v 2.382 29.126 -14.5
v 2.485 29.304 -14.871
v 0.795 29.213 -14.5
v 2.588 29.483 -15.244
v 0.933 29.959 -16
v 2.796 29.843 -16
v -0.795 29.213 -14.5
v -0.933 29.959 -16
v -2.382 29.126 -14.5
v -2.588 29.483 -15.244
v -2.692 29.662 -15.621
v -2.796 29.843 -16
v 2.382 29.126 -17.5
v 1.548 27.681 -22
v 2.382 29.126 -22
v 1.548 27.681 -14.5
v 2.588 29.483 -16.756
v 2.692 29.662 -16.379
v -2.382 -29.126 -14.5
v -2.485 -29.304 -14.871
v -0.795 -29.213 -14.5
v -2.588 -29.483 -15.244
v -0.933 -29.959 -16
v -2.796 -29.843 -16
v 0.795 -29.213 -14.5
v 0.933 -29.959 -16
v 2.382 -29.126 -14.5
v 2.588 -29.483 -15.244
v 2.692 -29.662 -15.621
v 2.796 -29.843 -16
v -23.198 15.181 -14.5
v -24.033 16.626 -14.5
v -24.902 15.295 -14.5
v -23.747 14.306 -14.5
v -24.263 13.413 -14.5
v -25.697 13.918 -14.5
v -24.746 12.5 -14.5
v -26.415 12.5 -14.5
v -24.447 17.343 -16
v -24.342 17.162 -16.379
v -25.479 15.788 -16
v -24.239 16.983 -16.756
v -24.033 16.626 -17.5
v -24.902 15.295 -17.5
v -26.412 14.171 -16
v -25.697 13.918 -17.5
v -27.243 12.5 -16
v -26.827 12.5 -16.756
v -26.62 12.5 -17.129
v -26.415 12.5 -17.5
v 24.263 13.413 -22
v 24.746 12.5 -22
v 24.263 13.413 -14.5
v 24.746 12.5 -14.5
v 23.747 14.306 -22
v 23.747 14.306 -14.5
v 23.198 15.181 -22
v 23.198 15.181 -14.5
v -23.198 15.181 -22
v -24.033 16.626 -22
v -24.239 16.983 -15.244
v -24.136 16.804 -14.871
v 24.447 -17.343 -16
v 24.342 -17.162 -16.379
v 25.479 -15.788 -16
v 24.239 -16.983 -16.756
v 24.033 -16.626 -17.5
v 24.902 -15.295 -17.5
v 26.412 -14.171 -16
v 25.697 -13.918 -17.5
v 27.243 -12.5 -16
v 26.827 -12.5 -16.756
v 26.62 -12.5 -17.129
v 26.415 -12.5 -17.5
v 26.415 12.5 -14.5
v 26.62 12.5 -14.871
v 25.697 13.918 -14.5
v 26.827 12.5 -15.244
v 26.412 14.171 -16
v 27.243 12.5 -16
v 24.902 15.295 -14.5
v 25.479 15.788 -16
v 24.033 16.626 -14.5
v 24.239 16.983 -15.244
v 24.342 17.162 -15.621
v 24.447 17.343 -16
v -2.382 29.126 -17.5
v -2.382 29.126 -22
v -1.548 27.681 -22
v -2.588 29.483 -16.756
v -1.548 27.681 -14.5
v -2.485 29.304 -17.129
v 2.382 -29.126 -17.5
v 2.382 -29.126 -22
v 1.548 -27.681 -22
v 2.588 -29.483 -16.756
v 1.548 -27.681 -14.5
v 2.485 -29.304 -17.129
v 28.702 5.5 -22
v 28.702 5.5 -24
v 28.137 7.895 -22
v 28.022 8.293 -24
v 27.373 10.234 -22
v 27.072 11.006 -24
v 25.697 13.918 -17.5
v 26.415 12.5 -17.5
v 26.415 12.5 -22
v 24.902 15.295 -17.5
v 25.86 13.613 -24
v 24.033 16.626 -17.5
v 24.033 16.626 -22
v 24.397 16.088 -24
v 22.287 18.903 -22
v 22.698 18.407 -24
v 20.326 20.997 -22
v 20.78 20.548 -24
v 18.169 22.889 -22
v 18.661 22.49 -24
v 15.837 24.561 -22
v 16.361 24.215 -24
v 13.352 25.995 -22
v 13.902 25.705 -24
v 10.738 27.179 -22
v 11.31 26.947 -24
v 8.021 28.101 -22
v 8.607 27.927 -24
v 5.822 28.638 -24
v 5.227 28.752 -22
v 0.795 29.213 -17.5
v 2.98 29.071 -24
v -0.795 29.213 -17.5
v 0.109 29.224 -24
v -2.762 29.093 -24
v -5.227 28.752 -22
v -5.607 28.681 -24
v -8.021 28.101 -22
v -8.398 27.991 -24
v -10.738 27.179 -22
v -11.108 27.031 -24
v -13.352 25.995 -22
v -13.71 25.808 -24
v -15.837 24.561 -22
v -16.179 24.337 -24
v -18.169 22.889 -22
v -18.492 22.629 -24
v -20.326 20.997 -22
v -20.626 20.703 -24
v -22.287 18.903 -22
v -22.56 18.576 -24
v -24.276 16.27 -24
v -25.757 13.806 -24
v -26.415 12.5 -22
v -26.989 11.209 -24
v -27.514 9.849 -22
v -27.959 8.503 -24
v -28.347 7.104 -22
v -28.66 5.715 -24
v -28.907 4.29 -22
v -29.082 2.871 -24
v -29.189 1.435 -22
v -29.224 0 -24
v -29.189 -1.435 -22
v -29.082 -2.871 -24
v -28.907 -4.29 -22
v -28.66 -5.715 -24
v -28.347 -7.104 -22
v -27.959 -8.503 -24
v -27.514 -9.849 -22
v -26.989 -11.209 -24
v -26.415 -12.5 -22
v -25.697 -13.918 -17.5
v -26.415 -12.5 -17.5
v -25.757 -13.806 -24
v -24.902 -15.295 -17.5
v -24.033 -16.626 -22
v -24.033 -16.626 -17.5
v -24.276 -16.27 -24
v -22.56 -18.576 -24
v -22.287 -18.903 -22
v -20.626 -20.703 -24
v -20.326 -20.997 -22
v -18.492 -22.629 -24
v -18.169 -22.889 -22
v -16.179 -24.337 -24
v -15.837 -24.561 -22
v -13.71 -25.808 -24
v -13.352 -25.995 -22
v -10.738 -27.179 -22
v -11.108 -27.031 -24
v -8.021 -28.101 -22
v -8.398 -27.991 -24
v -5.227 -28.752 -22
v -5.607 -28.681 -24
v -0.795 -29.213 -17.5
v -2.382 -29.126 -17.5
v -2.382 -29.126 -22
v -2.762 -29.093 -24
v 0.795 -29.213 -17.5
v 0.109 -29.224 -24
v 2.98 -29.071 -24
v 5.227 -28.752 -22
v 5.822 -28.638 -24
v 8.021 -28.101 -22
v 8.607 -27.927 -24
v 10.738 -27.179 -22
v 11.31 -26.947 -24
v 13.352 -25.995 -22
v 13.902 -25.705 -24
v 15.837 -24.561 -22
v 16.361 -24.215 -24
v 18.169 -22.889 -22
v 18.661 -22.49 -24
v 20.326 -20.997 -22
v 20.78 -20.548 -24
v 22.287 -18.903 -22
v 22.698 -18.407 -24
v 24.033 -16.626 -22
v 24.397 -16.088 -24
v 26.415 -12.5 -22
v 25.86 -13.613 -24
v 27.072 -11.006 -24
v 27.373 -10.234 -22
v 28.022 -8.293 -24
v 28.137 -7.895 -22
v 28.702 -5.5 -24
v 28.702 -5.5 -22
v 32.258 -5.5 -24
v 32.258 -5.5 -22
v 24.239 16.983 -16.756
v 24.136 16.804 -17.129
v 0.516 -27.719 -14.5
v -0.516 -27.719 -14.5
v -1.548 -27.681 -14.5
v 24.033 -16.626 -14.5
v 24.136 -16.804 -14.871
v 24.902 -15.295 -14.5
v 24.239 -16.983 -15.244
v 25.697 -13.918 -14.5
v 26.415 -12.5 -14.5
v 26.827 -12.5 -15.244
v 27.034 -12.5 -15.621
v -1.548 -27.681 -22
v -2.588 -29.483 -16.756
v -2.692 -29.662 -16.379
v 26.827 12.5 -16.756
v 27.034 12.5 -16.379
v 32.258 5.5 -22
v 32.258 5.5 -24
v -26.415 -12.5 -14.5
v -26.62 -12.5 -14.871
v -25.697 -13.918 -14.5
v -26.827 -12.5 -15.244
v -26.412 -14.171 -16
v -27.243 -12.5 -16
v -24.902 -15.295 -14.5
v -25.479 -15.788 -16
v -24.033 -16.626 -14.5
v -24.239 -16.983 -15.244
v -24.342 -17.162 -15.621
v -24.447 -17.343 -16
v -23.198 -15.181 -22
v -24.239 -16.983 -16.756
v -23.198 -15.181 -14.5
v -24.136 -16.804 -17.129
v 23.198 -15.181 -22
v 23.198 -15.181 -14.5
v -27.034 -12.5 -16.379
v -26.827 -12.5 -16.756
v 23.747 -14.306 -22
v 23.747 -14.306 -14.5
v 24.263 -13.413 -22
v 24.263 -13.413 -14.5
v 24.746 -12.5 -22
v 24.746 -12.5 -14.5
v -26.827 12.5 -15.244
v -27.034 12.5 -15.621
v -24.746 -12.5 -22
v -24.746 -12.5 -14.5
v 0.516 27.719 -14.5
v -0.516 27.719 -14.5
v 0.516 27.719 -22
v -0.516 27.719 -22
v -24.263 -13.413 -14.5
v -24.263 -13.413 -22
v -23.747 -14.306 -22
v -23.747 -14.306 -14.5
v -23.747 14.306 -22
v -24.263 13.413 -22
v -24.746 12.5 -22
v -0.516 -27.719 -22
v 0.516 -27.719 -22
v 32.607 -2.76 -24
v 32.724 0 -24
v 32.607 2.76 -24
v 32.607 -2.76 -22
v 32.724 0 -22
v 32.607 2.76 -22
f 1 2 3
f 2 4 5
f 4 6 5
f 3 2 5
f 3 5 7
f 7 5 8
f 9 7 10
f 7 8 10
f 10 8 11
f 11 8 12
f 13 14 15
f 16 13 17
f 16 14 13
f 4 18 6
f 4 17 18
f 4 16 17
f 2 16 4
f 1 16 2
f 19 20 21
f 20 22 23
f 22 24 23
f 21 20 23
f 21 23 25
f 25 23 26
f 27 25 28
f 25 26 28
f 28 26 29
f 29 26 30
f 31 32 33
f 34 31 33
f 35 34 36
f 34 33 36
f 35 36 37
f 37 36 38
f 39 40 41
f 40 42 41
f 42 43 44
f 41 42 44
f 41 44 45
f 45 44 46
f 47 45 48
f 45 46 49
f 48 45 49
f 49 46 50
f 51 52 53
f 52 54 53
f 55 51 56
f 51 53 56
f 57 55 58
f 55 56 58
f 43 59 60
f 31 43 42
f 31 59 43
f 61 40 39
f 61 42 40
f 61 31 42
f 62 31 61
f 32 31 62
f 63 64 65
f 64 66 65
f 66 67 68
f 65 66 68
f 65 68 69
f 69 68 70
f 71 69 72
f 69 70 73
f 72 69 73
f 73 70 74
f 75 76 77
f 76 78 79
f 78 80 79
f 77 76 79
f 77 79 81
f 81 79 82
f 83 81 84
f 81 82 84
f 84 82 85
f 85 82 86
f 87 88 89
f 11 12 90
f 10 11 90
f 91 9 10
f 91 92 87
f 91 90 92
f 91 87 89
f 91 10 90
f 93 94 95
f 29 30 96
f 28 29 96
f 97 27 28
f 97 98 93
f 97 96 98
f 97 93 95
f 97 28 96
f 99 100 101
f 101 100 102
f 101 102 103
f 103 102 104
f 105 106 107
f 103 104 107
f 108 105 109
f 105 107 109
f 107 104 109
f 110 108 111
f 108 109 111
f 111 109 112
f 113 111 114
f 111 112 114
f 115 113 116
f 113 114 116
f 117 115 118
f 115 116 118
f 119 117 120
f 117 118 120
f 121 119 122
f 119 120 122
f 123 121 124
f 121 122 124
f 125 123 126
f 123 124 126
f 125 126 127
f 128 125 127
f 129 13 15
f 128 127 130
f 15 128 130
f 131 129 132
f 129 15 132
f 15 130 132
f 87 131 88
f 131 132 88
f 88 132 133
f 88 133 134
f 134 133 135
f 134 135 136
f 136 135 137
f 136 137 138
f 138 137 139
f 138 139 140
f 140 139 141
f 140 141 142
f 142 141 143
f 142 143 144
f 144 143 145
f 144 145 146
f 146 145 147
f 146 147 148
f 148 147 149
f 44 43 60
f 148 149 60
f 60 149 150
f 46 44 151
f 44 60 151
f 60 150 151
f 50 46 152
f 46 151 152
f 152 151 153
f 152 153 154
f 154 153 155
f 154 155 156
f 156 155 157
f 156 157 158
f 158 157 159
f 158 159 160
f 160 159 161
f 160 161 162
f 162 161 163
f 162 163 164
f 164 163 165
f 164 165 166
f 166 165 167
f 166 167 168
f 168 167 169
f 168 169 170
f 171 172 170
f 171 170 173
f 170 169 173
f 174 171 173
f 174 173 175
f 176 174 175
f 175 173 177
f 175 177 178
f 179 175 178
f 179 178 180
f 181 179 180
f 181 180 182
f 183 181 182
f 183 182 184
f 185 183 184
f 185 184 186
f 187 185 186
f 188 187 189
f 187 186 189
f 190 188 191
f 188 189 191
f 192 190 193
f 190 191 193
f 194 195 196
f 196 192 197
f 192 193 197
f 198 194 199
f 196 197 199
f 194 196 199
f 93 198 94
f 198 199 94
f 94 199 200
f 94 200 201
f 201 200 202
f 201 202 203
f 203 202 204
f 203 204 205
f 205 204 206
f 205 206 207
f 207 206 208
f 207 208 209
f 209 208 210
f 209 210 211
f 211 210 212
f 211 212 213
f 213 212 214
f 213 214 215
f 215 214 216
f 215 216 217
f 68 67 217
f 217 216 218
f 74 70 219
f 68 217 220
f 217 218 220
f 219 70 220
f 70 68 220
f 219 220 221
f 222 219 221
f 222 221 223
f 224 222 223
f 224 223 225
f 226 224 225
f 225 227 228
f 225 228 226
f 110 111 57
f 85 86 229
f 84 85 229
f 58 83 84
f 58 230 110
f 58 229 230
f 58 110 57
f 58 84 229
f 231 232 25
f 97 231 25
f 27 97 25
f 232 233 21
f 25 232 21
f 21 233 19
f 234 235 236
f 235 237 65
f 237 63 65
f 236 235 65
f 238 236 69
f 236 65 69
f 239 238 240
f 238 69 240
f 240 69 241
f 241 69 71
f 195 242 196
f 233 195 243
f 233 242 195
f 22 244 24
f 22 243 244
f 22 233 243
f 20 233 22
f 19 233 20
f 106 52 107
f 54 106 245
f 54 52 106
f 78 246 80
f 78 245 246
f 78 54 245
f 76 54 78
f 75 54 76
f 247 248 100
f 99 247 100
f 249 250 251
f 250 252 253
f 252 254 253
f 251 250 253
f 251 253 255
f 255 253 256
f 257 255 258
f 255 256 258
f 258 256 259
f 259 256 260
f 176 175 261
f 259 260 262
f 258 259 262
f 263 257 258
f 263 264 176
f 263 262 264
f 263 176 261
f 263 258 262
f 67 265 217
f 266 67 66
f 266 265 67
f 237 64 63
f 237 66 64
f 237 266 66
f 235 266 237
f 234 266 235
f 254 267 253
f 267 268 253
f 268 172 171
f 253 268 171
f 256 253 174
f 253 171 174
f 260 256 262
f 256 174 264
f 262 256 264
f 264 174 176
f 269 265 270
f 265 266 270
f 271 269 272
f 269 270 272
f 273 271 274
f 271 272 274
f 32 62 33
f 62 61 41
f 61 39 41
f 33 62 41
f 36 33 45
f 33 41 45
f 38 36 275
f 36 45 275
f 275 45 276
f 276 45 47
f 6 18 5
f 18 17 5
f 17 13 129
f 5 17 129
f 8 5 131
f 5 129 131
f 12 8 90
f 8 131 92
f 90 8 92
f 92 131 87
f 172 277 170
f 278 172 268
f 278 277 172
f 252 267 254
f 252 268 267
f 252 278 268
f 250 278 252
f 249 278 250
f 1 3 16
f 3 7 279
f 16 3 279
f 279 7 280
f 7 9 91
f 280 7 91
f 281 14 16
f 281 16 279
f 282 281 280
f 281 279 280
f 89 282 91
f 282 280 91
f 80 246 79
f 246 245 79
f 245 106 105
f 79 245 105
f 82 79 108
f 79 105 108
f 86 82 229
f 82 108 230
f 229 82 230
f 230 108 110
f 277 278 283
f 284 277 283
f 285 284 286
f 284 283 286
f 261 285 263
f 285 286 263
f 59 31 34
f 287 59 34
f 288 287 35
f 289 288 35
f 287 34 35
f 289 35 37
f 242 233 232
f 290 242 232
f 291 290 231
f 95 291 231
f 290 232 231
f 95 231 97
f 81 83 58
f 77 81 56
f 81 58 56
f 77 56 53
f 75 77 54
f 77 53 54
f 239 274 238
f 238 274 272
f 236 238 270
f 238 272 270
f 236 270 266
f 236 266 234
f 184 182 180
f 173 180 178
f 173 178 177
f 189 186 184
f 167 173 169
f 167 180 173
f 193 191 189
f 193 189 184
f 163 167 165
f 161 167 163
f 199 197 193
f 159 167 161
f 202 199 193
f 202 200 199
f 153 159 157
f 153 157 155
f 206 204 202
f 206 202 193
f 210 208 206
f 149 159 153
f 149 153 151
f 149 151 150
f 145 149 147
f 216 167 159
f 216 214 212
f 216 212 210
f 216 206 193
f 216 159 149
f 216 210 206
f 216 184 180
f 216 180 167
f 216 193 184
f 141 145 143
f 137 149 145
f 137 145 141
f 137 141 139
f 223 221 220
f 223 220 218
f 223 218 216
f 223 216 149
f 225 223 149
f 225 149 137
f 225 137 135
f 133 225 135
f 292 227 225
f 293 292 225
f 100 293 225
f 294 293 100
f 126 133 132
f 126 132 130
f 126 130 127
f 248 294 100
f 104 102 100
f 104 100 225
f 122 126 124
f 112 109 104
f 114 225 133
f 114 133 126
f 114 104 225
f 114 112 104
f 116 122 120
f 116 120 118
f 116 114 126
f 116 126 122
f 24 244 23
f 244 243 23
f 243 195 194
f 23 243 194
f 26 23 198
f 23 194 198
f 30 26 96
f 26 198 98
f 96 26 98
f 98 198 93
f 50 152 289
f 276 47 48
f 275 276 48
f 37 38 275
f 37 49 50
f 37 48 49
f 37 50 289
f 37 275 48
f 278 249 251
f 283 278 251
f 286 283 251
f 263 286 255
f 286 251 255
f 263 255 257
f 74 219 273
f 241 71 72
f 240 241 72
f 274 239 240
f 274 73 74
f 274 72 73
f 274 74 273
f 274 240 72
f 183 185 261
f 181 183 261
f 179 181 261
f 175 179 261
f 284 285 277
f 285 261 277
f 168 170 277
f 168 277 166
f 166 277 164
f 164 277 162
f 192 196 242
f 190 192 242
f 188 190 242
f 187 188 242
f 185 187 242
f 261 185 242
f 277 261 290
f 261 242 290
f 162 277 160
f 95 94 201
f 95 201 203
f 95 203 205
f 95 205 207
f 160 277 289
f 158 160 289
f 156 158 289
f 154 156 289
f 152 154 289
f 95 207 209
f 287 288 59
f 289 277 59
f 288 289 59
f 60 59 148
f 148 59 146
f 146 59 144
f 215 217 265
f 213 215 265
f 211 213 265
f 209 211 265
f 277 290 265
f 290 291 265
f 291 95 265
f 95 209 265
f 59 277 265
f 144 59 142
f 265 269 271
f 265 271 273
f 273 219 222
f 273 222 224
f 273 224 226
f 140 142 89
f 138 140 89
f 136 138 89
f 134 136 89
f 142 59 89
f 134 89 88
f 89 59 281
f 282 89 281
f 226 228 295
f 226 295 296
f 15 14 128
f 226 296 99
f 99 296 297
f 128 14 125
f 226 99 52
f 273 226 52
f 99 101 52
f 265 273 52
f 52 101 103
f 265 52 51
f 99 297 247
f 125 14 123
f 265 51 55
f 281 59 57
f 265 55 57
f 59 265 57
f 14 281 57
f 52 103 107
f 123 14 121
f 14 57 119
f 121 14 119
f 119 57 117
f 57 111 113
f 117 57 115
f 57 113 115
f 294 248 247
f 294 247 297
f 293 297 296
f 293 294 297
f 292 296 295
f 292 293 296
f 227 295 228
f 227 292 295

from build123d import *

# Parameters (mm, degrees)
POCKET002_DEPTH = 7.5
PAD001_DEPTH    = 2


with BuildPart() as part:
    # Sketch004 → Revolution001 (revolve)
    with BuildSketch(Plane.YZ):
        Polygon((0, -22), (27.72376, -22), (27.72376, -14.5), (29.22376, -14.5), (29.97376, -16), (29.22376, -17.5), (29.22376, -24), (0, -24), align=None)
    revolve(axis=Axis((0, 0, 0), (0, 0, 1)))

    # Sketch005 (on Face3 of Revolution001) → Pocket002 (cut)
    with BuildSketch(Plane(origin=(0, 0, -14.5), x_dir=(0, -1, 0), z_dir=(0, 0, 1))):
        Polygon((-12.5, 31.22376), (12.5, 31.22376), (12.5, 21.650635), (20.790569, 26.437197), (33.290569, 4.786562), (25, 0), (33.290569, -4.786562), (20.790569, -26.437197), (12.5, -21.650635), (12.5, -31.22376), (-12.5, -31.22376), (-12.5, -21.650635), (-20.790569, -26.437197), (-33.290569, -4.786562), (-25, 0), (-33.290569, 4.786562), (-20.790569, 26.437197), (-12.5, 21.650635), align=None)
    extrude(amount=-POCKET002_DEPTH, mode=Mode.SUBTRACT)

    # Sketch006 (on Face39 of Pocket002) → Pad001 (join)
    with BuildSketch(Plane.YX.offset(24)):
        with BuildLine():
            ThreePointArc((5.5, 32.258246), (0, 32.72376), (-5.5, 32.258246))
            Line((-5.5, 32.258246), (-5.5, 0))
            Line((5.5, 0), (-5.5, 0))
            Line((5.5, 32.258246), (5.5, 0))
        make_face()
    extrude(amount=-PAD001_DEPTH)


solid = part.part
